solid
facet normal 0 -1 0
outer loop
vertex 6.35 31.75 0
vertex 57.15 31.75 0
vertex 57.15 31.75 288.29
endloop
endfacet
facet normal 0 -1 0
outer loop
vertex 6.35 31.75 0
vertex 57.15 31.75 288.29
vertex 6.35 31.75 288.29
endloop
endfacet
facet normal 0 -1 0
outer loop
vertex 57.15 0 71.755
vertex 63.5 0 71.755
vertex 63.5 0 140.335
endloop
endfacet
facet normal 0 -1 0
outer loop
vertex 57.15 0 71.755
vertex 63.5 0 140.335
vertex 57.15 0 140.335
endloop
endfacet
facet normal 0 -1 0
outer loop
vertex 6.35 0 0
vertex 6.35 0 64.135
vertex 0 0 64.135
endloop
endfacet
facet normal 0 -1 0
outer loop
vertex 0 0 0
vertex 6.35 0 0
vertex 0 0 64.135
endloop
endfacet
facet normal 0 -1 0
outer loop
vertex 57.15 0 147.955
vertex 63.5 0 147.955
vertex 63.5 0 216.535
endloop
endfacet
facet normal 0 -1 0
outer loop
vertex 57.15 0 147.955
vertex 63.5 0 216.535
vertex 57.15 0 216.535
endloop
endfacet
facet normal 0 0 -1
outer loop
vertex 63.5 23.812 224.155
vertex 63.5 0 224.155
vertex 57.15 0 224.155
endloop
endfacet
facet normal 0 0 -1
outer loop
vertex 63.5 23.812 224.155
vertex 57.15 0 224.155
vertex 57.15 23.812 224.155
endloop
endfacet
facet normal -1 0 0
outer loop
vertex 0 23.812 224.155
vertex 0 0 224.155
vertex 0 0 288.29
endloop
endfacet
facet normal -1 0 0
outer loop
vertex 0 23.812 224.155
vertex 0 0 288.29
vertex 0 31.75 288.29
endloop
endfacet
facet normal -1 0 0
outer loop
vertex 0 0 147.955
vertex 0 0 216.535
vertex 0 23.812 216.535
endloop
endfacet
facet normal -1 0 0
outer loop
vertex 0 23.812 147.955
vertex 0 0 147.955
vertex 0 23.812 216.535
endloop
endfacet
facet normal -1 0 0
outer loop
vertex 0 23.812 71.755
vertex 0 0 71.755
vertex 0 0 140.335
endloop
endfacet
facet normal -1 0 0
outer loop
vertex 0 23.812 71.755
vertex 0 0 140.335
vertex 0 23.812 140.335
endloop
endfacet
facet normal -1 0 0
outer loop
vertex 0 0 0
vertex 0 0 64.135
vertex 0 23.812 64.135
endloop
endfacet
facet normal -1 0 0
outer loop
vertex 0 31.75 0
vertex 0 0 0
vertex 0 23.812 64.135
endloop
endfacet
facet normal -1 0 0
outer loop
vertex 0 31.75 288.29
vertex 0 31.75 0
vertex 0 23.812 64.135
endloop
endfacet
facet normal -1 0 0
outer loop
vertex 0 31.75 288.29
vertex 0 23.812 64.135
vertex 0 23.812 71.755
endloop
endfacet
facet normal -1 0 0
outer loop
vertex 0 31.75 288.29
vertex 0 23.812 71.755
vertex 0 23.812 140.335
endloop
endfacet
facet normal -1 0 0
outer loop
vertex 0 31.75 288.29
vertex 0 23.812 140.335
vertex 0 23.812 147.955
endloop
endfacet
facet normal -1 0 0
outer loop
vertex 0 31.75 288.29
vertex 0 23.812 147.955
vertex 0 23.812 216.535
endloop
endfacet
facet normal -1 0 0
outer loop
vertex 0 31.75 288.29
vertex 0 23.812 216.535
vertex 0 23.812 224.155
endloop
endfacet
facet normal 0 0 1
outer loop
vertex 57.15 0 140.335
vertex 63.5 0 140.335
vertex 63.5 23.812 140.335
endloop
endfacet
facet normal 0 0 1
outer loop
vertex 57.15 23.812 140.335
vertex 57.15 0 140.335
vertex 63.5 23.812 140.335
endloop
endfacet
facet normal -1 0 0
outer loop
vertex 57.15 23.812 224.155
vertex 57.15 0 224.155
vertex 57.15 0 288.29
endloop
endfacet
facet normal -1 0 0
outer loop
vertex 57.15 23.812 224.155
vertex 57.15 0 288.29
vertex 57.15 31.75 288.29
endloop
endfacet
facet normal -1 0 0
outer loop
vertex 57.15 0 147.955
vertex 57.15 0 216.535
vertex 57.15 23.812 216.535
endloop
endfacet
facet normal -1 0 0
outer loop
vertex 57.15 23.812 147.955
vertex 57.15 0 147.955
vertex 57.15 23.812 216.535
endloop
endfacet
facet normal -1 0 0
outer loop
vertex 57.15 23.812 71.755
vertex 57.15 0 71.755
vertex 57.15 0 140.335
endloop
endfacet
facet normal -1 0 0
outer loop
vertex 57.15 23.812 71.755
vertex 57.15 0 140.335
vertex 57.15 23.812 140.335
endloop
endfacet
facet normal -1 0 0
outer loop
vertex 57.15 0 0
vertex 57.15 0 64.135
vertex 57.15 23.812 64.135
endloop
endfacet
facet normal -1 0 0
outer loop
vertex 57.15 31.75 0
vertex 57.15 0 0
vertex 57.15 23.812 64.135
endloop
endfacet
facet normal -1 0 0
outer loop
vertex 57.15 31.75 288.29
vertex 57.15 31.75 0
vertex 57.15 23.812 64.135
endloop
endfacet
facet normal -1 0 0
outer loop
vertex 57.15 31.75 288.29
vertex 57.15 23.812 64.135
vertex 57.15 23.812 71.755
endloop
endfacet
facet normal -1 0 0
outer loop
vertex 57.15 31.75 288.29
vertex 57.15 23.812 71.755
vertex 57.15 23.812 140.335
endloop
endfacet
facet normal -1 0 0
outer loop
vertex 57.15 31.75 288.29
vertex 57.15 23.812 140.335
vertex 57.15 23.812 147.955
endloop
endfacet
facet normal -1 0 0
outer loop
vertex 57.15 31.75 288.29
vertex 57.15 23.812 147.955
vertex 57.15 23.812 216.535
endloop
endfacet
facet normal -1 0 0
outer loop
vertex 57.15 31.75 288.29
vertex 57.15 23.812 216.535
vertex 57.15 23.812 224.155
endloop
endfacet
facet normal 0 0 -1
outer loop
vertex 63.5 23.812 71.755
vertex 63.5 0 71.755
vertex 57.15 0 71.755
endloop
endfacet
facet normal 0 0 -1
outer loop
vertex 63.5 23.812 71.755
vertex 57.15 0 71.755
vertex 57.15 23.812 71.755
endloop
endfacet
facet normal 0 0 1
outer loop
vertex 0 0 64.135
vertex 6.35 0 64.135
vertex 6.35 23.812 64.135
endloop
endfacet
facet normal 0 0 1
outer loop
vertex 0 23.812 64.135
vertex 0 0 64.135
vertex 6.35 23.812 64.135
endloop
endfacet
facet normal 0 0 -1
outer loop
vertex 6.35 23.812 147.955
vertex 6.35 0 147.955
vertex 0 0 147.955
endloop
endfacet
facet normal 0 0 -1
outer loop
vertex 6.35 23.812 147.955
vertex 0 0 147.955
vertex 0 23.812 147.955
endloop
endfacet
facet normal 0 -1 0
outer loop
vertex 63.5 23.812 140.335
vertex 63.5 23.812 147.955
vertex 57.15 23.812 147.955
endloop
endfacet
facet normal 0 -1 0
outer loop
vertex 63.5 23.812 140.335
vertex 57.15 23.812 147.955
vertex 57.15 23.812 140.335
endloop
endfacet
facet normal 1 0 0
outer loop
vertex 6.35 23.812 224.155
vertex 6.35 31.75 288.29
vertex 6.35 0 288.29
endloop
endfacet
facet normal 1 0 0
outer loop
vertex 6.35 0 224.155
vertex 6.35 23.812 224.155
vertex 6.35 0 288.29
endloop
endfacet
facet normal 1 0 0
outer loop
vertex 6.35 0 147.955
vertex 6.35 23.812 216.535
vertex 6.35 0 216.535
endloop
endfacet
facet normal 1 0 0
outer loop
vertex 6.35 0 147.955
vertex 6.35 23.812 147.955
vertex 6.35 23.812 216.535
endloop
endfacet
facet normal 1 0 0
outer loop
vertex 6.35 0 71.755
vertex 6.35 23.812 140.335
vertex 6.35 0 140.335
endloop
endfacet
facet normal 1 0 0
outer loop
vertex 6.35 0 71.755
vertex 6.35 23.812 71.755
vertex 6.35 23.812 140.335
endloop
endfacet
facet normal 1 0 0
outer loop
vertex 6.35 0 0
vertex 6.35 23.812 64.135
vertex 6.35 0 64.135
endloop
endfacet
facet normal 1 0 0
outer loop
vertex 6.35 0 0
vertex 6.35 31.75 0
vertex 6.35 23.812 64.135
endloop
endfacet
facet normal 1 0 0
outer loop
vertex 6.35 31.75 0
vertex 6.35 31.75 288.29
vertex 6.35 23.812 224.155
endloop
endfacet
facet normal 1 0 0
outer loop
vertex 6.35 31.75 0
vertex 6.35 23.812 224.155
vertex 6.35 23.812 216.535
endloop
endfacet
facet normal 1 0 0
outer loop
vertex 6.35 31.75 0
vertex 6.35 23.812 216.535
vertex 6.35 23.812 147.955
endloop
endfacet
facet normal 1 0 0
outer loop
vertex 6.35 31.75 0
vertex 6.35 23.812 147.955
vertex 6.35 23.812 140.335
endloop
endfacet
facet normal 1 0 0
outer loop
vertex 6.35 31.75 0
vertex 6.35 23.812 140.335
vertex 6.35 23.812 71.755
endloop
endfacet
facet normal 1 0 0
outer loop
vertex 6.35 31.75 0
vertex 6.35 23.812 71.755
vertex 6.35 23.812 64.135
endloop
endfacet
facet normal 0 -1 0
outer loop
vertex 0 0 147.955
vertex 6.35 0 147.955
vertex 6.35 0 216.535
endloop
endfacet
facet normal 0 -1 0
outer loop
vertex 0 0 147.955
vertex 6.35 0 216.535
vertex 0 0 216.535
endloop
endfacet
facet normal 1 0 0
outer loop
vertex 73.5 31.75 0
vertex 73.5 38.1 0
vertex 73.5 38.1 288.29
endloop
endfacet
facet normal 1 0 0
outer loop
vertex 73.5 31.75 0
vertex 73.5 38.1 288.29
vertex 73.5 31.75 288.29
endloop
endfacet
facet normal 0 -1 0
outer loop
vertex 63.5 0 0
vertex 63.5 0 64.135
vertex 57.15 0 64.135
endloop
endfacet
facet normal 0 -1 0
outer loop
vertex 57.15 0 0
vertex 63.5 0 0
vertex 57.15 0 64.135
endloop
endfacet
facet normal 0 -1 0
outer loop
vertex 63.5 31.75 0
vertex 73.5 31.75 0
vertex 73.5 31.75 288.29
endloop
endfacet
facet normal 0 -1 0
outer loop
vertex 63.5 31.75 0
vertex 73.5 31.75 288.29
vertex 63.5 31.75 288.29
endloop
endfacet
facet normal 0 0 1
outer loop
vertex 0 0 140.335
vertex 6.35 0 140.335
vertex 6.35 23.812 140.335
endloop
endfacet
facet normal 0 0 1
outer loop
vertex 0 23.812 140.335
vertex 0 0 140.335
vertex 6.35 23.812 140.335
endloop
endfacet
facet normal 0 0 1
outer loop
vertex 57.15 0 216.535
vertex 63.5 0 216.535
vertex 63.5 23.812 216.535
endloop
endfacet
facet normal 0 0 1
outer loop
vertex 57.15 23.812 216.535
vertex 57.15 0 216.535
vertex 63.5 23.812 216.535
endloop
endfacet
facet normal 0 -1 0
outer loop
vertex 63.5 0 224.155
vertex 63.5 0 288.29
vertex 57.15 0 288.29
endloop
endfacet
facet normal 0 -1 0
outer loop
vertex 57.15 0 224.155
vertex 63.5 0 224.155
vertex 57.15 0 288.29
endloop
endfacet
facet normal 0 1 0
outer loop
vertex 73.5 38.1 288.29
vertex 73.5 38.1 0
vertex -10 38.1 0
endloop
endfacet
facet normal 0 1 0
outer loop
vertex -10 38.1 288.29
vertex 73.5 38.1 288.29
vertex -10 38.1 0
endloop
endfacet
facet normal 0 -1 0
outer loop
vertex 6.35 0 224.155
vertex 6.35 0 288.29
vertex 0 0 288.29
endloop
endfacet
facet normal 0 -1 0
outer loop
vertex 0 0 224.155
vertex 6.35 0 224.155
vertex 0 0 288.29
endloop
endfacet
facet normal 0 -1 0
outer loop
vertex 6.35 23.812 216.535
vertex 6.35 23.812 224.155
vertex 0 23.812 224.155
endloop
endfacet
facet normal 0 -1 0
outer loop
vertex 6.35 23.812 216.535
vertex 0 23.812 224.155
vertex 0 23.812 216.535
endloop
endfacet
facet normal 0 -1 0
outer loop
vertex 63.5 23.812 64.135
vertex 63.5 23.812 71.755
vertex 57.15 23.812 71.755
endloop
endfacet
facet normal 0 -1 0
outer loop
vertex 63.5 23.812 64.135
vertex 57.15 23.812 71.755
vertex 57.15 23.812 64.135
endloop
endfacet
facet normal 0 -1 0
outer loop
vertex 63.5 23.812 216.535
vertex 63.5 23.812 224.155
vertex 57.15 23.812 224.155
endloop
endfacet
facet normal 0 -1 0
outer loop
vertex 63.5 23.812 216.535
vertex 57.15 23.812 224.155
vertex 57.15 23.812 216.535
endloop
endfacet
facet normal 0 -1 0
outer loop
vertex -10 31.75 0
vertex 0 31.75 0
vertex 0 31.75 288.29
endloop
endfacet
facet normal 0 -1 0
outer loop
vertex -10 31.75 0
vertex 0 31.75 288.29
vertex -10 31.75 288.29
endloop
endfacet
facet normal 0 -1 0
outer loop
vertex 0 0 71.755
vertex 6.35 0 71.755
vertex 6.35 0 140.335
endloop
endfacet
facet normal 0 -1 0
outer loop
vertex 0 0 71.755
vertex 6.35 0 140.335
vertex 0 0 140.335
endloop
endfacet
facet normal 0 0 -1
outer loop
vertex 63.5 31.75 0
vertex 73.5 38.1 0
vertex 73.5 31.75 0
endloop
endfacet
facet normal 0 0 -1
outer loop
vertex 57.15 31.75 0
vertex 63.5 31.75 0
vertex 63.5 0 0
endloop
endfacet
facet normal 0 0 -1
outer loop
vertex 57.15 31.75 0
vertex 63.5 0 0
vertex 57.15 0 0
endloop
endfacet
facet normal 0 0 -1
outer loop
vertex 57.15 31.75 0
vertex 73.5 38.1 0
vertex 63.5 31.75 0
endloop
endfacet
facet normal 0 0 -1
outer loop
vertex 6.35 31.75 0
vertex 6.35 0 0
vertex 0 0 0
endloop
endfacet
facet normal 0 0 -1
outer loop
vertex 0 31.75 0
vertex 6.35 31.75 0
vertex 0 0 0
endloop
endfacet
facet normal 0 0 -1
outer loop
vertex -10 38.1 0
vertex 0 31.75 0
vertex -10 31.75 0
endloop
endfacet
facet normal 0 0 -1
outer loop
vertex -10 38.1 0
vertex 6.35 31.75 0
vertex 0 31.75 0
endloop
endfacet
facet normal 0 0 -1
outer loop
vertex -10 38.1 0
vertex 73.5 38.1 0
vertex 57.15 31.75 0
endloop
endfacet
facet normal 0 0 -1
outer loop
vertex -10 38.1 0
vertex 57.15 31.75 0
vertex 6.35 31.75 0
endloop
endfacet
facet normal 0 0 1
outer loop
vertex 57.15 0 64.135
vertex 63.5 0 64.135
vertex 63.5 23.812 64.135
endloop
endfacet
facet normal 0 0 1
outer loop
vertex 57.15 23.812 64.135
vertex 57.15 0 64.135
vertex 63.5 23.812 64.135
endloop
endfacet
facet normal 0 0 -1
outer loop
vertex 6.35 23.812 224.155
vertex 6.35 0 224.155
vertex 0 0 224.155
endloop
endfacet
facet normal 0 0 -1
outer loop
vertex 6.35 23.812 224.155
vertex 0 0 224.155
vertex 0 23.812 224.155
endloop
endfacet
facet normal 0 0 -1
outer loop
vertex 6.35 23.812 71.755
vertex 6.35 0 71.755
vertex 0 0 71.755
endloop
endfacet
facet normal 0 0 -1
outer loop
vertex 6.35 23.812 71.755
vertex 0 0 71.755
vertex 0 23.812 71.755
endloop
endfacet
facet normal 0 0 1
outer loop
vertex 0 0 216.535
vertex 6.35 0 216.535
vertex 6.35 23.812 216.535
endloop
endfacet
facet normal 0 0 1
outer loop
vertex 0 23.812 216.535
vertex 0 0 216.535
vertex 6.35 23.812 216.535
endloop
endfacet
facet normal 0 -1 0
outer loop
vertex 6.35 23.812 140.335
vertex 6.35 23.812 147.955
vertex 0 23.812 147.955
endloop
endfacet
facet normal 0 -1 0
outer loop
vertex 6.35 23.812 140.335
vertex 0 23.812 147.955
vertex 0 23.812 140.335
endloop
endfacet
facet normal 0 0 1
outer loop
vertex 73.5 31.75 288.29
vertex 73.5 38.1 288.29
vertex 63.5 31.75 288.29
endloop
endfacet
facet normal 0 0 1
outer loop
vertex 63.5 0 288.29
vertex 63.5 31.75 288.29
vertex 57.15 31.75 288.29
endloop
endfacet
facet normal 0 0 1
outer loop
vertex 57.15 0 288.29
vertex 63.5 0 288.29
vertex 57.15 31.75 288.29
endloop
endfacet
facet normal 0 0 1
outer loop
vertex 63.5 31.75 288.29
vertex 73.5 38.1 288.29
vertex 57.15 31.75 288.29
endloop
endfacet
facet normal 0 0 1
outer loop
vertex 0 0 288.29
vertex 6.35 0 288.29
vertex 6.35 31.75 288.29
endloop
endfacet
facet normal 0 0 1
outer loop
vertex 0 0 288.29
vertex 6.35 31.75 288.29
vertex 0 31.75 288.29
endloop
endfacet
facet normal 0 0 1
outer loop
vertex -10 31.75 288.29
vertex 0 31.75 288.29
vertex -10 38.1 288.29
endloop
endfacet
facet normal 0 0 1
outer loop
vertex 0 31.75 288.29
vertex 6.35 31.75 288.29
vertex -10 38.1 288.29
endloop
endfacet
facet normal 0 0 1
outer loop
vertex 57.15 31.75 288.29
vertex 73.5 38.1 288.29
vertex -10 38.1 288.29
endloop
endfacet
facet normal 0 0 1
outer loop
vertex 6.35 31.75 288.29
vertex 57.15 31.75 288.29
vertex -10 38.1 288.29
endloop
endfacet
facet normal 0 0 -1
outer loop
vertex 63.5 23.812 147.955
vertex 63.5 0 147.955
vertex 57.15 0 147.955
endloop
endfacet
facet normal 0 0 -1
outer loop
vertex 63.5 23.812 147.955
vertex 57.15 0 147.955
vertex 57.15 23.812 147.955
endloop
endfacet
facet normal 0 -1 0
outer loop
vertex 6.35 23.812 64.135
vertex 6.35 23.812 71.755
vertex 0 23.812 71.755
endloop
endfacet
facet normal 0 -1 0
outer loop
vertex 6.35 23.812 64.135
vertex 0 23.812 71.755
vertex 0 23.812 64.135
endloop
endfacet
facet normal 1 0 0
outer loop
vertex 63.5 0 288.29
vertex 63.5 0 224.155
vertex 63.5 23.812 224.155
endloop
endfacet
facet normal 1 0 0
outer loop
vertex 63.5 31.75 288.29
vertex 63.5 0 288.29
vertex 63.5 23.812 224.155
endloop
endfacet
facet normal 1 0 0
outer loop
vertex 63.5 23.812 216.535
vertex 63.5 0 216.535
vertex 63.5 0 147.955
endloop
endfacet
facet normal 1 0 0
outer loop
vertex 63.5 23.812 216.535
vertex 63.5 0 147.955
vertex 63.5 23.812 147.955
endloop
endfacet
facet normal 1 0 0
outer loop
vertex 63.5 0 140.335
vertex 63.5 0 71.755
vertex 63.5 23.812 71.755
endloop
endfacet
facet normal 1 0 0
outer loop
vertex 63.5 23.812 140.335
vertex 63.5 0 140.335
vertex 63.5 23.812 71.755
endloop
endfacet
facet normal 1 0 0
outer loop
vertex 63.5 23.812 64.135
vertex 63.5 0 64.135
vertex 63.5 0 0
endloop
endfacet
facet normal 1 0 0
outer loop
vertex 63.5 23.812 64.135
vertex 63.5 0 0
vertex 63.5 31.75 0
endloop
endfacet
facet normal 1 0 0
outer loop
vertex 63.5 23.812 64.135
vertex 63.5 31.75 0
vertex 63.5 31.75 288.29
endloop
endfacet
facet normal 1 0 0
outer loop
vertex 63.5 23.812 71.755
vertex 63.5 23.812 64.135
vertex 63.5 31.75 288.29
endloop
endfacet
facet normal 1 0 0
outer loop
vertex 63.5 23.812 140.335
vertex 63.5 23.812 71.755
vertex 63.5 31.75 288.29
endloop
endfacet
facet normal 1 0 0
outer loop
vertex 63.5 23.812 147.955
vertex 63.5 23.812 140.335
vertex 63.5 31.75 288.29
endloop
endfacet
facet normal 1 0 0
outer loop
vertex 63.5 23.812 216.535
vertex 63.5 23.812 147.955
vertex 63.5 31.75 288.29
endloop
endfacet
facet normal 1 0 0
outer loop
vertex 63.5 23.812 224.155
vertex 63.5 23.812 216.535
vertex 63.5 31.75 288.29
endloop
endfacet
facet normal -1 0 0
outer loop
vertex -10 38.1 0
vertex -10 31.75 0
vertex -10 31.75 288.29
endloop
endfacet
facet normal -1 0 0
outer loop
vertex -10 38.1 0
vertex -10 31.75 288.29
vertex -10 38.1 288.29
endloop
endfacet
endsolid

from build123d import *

# Parameters (mm, degrees)
BOSS_EXTRUDE1_DEPTH = 288.29
CUT_EXTRUDE2_REACH  = 301.942
SKETCH4_W           = 7.62
SKETCH4_H           = 23.8125
LPATTERN1_COUNT     = 3
LPATTERN1_PITCH     = 76.2


with BuildPart() as part:
    # Sketch1 → Boss-Extrude1 (new body)
    with BuildSketch(Plane.XY):
        Polygon((57.15, 0), (57.15, 31.75), (6.35, 31.75), (6.35, 0), (0, 0), (0, 31.75), (-10, 31.75), (-10, 38.1), (0, 38.1), (63.5, 38.1), (73.5, 38.1), (73.5, 31.75), (63.5, 31.75), (63.5, 9.525), (63.5, 0), align=None)
    extrude(amount=BOSS_EXTRUDE1_DEPTH)

    # Cut-Extrude2: up to this face of the body (flat: up to its plane)
    cut_extrude2_end = Plane(part.part.faces().sort_by_distance((0, 15.875, 144.145))[0])
    # Sketch4 → Cut-Extrude2 (cut, up to the picked face)
    with BuildSketch(Plane(origin=(63.5, 0, 0), x_dir=(0, 0, -1), z_dir=(1, 0, 0)), mode=Mode.PRIVATE) as cut_extrude2_sk1:
        with Locations((-220.345, 11.90625)):
            Rectangle(SKETCH4_W, SKETCH4_H)
    cut_extrude2_tool1 = split(extrude(cut_extrude2_sk1.sketch, amount=-CUT_EXTRUDE2_REACH, mode=Mode.PRIVATE), bisect_by=cut_extrude2_end, keep=Keep.BOTH, mode=Mode.PRIVATE)
    cut_extrude2 = cut_extrude2_tool1.solids().sort_by(Axis((63.5, 11.90625, 220.345), (-1, 0, 0)))[0]
    add(cut_extrude2, mode=Mode.SUBTRACT)

    # LPattern1: Cut-Extrude2 ×3
    with Locations(*[(0, 0, -i * LPATTERN1_PITCH) for i in range(1, LPATTERN1_COUNT)]):
        add(cut_extrude2, mode=Mode.SUBTRACT)


solid = part.part
